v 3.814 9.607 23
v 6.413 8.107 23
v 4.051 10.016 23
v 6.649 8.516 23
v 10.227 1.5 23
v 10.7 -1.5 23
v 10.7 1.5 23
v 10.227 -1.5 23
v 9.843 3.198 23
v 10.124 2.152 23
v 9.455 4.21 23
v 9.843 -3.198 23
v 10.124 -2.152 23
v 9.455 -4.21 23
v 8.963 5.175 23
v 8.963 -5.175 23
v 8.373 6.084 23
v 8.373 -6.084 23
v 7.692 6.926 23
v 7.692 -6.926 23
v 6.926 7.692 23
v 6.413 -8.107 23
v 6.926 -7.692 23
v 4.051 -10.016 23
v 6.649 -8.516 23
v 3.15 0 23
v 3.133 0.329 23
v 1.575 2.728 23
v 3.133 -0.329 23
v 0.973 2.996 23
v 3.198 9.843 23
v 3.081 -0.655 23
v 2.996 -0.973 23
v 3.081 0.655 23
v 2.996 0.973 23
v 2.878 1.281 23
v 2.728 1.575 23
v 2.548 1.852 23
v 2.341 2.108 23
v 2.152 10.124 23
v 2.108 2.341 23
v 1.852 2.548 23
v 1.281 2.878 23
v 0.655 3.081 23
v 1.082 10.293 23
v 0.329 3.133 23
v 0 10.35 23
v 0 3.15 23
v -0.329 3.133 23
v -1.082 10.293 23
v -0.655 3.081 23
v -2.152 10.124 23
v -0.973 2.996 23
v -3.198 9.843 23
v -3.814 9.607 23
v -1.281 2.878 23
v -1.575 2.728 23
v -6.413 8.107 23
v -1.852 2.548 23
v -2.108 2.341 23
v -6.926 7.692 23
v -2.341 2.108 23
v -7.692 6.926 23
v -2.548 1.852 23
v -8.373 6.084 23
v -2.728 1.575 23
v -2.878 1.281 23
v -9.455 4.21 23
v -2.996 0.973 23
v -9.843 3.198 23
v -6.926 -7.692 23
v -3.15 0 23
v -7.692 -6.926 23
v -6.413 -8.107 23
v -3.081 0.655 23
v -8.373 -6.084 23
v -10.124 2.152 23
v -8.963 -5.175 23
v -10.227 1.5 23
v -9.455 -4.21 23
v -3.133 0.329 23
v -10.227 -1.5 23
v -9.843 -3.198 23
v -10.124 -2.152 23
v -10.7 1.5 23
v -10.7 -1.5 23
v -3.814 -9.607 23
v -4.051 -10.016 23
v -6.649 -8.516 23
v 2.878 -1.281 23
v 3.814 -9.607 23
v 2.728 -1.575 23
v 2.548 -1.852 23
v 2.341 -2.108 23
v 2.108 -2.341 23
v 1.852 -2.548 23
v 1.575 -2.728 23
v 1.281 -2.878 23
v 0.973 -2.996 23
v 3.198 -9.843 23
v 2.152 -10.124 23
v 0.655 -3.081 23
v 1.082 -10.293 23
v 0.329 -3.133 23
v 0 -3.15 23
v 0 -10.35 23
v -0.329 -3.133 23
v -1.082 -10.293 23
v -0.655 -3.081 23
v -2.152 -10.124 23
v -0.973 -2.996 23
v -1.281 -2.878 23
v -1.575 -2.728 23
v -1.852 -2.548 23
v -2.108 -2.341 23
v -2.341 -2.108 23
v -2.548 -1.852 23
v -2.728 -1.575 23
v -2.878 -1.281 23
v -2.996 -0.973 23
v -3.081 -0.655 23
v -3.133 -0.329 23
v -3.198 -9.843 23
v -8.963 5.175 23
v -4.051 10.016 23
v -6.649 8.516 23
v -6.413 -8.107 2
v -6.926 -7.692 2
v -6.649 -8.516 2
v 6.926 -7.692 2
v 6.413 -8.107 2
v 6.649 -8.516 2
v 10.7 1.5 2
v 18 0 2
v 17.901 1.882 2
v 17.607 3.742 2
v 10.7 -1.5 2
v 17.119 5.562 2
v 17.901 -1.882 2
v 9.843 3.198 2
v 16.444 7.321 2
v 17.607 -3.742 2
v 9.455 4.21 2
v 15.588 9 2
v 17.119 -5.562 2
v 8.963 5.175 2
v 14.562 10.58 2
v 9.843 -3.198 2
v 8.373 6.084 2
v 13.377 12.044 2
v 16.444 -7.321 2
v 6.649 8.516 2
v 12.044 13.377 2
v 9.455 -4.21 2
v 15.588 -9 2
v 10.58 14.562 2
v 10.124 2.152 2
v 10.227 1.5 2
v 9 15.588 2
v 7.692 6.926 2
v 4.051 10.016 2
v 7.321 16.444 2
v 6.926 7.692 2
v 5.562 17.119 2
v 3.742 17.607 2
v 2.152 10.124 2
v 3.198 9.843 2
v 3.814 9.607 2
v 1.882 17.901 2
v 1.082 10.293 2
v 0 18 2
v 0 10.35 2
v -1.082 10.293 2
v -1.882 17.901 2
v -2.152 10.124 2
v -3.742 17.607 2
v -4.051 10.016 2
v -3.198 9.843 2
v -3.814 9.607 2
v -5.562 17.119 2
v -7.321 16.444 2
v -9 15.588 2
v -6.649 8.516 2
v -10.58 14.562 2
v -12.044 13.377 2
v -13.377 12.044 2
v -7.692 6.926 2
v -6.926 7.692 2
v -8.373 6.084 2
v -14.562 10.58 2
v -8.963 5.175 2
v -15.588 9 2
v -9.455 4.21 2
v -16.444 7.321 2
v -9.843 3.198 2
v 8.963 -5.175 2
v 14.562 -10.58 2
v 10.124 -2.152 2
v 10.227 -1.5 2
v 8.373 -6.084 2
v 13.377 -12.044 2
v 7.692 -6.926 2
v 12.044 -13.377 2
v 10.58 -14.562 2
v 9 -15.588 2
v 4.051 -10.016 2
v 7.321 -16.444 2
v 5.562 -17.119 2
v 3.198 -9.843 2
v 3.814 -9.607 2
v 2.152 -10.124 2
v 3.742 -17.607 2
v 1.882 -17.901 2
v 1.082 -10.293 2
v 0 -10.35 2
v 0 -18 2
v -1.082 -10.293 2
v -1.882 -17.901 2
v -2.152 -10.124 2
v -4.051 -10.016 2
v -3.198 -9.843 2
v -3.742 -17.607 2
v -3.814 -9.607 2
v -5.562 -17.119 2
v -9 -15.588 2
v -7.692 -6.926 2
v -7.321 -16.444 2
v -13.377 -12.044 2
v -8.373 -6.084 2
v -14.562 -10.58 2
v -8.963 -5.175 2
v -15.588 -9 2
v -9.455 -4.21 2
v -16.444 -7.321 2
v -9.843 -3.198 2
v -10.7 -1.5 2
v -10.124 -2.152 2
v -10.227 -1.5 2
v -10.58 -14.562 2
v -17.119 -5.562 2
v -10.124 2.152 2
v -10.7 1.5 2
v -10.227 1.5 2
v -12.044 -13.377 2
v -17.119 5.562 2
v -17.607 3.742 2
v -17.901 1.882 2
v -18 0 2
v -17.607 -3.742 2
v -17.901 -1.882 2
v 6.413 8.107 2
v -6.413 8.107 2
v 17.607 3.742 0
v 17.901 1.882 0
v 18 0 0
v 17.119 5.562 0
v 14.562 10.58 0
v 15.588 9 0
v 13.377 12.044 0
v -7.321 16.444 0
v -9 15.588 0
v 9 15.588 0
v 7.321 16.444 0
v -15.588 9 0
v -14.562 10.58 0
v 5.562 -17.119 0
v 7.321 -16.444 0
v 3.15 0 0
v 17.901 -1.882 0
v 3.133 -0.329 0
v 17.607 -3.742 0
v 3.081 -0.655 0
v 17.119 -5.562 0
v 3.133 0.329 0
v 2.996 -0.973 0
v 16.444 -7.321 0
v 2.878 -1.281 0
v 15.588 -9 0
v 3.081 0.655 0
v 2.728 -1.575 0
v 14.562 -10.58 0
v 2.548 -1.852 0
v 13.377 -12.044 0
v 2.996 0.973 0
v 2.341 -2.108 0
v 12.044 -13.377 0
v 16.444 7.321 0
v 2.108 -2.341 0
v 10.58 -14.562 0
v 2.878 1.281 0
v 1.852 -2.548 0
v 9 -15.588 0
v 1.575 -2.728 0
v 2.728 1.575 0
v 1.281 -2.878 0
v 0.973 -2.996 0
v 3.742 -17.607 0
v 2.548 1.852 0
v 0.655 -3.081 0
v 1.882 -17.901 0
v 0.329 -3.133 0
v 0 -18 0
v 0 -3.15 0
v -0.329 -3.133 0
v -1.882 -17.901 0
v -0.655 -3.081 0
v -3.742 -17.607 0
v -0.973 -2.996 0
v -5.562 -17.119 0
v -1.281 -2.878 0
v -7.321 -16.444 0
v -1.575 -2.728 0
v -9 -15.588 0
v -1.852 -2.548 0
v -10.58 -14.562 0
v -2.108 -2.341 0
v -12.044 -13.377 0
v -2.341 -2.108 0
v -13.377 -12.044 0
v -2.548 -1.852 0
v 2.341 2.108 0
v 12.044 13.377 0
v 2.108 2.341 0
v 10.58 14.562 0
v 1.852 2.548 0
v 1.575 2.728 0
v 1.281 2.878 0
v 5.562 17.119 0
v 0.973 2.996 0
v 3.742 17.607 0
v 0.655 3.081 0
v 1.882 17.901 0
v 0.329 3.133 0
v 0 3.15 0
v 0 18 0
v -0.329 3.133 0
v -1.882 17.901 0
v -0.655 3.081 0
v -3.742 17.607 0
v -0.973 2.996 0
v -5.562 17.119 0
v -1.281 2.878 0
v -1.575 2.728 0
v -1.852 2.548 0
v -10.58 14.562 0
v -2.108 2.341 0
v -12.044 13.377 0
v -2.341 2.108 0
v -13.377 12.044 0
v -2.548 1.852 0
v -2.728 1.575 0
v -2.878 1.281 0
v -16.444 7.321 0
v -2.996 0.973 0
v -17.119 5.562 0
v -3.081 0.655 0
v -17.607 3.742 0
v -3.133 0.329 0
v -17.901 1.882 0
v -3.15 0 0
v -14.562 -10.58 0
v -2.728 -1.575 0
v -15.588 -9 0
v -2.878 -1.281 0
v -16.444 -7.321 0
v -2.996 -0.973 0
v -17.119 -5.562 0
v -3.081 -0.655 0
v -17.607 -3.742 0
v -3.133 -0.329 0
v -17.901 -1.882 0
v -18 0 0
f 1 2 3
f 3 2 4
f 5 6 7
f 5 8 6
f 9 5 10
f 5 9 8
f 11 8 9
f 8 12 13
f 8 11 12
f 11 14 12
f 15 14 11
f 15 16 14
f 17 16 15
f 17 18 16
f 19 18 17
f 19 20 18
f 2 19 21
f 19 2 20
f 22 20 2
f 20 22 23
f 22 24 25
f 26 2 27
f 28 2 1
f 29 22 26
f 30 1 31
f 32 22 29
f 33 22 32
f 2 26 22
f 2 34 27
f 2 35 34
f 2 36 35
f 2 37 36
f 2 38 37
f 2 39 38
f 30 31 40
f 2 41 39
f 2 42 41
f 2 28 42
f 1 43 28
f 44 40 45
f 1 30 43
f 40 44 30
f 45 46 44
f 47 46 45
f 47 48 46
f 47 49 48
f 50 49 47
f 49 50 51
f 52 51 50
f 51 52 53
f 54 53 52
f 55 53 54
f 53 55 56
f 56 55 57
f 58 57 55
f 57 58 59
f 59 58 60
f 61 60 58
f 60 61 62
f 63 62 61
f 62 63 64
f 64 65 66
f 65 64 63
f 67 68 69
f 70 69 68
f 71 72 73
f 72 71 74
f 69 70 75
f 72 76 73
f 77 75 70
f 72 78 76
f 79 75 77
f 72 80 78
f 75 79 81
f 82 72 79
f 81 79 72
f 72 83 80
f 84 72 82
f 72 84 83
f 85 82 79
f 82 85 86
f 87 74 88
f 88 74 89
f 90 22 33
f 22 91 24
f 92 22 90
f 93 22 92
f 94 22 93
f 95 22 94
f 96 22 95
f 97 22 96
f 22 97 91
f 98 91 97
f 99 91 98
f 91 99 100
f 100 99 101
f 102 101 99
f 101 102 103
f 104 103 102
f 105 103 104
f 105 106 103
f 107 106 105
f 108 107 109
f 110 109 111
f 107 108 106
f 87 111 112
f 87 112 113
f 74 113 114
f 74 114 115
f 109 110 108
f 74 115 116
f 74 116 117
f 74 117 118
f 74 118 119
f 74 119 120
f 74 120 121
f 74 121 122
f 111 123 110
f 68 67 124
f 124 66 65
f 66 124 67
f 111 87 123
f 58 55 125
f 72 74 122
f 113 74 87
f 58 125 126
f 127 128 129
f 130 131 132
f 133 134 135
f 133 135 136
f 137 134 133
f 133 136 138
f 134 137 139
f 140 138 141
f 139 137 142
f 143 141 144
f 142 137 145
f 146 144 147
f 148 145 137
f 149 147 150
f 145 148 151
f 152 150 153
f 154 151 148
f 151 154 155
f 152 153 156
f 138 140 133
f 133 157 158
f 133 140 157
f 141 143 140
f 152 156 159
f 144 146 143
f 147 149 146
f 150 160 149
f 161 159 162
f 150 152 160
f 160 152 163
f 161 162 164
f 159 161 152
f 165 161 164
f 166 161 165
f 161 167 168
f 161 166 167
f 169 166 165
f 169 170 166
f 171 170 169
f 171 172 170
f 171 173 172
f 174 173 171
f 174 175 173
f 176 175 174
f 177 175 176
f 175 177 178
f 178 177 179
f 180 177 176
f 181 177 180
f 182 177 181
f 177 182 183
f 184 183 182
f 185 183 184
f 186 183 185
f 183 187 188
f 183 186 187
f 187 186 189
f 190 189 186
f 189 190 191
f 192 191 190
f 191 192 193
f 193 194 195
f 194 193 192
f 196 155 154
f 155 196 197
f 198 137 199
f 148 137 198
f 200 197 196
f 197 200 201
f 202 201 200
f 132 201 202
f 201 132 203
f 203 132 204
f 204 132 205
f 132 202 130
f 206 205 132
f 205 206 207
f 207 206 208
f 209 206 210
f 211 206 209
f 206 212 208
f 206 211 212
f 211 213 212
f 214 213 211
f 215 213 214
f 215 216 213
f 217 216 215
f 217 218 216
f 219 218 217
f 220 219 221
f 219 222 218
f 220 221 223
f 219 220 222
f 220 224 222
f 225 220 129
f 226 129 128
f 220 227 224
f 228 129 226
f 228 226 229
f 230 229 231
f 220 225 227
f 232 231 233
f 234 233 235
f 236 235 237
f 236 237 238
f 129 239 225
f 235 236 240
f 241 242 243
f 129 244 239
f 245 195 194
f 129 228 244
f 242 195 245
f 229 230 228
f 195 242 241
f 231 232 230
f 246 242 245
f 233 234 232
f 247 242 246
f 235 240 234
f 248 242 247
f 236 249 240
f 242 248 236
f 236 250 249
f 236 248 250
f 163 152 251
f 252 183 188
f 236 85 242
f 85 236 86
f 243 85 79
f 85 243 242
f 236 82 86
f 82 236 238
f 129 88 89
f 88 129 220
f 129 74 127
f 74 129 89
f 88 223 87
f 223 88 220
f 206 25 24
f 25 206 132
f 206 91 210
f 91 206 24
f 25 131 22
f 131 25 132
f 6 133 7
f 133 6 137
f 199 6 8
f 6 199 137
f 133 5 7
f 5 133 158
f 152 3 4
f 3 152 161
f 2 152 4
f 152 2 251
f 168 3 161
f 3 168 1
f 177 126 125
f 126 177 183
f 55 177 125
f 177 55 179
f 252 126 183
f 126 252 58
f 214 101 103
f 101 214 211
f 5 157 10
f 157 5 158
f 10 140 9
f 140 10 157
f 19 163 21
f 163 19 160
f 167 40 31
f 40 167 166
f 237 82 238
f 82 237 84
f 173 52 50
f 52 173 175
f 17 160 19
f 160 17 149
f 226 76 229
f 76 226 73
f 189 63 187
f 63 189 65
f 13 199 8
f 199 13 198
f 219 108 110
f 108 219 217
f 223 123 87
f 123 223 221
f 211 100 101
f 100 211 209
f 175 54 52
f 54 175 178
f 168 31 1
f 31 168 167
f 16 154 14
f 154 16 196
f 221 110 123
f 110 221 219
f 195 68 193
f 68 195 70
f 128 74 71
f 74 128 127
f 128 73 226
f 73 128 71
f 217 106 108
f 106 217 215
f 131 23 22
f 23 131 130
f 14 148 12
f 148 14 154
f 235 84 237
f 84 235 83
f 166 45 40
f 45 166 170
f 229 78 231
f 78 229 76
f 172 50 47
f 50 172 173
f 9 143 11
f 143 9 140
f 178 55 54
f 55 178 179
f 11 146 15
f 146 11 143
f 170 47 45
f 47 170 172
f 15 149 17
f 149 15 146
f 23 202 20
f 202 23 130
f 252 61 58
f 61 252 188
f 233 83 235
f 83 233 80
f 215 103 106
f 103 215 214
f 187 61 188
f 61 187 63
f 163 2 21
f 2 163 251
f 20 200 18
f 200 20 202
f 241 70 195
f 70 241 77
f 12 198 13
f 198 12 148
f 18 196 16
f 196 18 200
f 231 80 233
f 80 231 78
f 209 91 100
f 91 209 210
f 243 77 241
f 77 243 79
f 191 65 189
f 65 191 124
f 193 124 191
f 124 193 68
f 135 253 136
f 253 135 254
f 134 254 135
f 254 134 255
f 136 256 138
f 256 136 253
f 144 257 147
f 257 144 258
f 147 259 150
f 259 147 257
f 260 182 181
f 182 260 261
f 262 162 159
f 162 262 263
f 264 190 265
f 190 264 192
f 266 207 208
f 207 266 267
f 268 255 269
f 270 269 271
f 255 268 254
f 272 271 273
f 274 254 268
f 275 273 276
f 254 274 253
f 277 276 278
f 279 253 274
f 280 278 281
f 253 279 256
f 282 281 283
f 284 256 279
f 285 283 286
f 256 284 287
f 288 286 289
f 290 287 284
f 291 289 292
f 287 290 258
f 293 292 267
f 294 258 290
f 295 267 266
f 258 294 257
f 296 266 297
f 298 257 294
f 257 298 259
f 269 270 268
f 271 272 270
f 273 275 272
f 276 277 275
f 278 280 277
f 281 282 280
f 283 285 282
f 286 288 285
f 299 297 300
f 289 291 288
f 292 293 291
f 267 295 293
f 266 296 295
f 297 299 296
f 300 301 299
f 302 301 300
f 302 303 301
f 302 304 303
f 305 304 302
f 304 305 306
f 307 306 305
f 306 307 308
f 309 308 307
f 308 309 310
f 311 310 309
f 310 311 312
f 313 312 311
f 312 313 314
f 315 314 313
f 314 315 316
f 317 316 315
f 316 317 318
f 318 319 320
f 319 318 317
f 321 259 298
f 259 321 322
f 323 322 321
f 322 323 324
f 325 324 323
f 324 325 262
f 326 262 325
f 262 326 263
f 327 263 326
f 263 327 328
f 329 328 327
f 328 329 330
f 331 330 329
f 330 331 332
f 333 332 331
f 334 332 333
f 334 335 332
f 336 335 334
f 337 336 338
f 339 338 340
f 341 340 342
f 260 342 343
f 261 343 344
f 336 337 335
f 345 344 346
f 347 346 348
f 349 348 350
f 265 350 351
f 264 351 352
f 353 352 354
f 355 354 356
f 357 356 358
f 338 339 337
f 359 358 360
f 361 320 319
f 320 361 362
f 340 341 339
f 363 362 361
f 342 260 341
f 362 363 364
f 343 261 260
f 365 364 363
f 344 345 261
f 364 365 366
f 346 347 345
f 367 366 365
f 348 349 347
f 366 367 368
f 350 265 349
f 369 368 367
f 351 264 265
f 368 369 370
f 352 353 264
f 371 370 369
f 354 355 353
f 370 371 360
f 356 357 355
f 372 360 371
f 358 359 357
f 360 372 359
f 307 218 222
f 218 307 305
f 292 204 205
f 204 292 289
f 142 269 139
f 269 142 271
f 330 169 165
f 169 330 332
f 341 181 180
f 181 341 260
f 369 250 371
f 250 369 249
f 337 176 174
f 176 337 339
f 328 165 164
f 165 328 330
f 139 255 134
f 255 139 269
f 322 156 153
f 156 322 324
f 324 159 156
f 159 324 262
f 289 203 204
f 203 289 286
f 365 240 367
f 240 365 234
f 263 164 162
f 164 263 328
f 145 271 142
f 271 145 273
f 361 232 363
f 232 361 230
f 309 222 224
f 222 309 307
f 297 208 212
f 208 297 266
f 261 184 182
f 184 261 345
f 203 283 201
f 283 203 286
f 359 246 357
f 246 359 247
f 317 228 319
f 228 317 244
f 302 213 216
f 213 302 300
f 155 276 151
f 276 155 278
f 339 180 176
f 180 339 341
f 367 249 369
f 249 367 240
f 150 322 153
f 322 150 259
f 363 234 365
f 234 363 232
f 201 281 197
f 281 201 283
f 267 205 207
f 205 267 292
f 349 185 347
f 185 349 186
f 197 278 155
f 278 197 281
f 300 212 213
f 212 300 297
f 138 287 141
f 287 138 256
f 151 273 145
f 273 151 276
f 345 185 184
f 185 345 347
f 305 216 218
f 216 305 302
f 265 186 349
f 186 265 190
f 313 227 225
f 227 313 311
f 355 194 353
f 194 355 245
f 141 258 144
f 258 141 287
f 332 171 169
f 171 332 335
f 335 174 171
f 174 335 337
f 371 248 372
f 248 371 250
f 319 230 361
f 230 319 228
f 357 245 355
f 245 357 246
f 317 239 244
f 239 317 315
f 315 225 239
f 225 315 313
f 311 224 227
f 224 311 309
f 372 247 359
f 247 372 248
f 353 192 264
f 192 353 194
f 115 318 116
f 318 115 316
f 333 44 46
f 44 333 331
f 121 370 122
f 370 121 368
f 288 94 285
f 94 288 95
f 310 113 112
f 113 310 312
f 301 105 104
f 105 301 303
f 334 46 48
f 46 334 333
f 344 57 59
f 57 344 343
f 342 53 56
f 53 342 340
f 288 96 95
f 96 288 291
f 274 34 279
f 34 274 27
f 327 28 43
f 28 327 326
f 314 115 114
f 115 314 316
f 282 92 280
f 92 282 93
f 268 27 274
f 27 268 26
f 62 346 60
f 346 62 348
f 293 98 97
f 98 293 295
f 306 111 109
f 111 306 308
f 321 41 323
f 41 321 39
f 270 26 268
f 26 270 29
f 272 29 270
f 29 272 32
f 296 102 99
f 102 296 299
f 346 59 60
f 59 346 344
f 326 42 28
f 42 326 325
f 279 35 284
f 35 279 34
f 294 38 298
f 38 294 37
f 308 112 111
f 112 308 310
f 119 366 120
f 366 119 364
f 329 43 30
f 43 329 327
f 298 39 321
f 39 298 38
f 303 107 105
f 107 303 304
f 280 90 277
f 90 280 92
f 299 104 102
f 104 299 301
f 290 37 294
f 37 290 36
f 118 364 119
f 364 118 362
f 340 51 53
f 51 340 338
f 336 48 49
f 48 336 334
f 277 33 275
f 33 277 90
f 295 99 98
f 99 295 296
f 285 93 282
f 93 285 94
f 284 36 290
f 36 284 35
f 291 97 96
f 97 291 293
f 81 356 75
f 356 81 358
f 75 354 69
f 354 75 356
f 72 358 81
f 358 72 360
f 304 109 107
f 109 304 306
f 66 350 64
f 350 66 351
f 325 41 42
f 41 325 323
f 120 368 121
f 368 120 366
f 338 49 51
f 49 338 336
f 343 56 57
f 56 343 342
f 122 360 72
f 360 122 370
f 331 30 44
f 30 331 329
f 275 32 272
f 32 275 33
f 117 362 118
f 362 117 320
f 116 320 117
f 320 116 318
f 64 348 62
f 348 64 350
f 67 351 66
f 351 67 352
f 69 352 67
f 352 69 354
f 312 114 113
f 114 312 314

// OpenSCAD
// [FL_INDEX: keywords="openscad, 3d_parametric, Customizable_Solar_Light_Base, csg_solid" | COT="Parametric OpenSCAD design from 3DCodeverse"]
// Title: Customizable Solar Light Base

// A Base for Solar Lights.
// By Ari M. Diacou
// http://www.thingiverse.com/thing:78398
// A 6"x1/4" landscaping nail gets hammered through the middle, and the light slides on top
// Default values are for a stand tube with an internal diameter of 7/8" for a set of Solar Lights sold by Costco


//Diameter of the male part
D=21;	
	
//Height of the male part, most pieces are around D=H 
H=21; 		

//Height of the base in mm
H2 = 2; 			

//Diameter of the base in mm
D2 = 36; 			

//How much the ribs/male part come past the given diameter D
tolerance = 0.2;	

//How far the ribs come out from the first diameter
delta=0.5;		

//Bore diameter 1/4"=6.35 mm for landscaping stake
B=6.3; 			

Resolution = 60; //internal variable for resolution of rendering
$fn=Resolution; 

number_of_ribs = 6;

rib_thickness = 3;

difference(){ 	//remove the bore from...
	union() {		//add the male part, base and ribs
		translate([0,0,H2]) cylinder(h=H, r=(D+tolerance-delta)/2);		//male part
		cylinder(h=H2, r=D2/2);													//base
		ribs(number_of_ribs);														//ribs, defined below
		}
	cylinder(h=H+H2, r=B/2); 													//the bore
	}

module ribs(n){ //creates n ribs spaced axially around the bore, extending tolerance beyond D/2
	R=D/2+tolerance;
	thickness = rib_thickness;
	if (n > 0){	//if you dont put this in, and call ribs(0), shit crashes
		for ( i = [0 : 5] ){
    			rotate( i * 360 / n, [0, 0, 1])
    			translate([-R, -thickness/2, H2]) 
			cube([R, thickness, H]);
			}
	}
}




			
